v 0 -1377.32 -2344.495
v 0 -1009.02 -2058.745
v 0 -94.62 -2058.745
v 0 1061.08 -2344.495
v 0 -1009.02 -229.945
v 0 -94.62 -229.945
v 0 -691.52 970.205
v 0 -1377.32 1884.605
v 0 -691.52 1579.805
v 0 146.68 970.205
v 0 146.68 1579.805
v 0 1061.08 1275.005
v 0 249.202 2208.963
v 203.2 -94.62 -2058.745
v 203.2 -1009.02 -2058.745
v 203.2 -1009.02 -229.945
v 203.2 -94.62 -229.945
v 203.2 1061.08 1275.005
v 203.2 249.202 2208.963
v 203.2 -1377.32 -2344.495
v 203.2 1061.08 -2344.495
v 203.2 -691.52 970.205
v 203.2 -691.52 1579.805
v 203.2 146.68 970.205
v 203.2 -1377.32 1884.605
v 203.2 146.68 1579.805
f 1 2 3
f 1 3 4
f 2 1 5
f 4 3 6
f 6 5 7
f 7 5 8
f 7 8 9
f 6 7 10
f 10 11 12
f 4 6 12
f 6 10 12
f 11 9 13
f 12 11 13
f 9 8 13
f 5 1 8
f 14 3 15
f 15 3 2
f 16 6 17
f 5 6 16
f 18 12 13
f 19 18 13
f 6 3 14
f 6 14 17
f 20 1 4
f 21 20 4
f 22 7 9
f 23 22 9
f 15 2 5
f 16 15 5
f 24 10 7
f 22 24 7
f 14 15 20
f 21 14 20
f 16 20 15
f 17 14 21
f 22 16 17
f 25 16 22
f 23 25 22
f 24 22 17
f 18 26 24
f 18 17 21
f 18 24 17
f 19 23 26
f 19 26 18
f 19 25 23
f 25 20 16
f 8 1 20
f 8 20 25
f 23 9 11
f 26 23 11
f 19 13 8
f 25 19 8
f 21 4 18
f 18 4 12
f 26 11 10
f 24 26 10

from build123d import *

# Parameters (mm, degrees)
F0_W     = 2438.4
F0_H     = 4707.636
F1_DEPTH = 203.2
F2_W     = 914.4
F2_H     = 1828.8
F3_DEPTH = 203.2
F4_W     = 596.9
F4_H     = 609.6
F5_DEPTH = 203.2


with BuildPart() as f1:
    # F0 (on Right) → F1 (new body)
    with BuildSketch(Plane.YZ):
        with Locations((-158.120304, 9.323397)):
            Rectangle(F0_W, F0_H)
    extrude(amount=F1_DEPTH)

    # F2 (on face) → F3 (cut)
    with BuildSketch(Plane(origin=(0, 0, 0), x_dir=(0, -1, 0), z_dir=(-1, 0, 0))):
        Polygon((-1061.079696, 1275.005397), (-249.202393, 2208.963397), (-249.202393, 2363.141397), (-1061.079696, 2363.141397), align=None)
        Polygon((-249.202393, 2363.141397), (-249.202393, 2208.963397), (1377.320304, 1884.605397), (1377.320304, 2363.141397), align=None)
        with Locations((551.820304, -1144.344603)):
            Rectangle(F2_W, F2_H)
    extrude(amount=-F3_DEPTH, mode=Mode.SUBTRACT)

    # F4 (on face) → F5 (cut)
    with BuildSketch(Plane(origin=(0, 0, 0), x_dir=(0, -1, 0), z_dir=(-1, 0, 0))):
        Polygon((-146.679696, 970.205397), (94.620304, 970.205397), (94.620304, 1579.805397), (-146.679696, 1579.805397), (-146.679696, 1157.968163), align=None)
        with Locations((393.070304, 1275.005397)):
            Rectangle(F4_W, F4_H)
    extrude(amount=-F5_DEPTH, mode=Mode.SUBTRACT)


solid = f1.part
